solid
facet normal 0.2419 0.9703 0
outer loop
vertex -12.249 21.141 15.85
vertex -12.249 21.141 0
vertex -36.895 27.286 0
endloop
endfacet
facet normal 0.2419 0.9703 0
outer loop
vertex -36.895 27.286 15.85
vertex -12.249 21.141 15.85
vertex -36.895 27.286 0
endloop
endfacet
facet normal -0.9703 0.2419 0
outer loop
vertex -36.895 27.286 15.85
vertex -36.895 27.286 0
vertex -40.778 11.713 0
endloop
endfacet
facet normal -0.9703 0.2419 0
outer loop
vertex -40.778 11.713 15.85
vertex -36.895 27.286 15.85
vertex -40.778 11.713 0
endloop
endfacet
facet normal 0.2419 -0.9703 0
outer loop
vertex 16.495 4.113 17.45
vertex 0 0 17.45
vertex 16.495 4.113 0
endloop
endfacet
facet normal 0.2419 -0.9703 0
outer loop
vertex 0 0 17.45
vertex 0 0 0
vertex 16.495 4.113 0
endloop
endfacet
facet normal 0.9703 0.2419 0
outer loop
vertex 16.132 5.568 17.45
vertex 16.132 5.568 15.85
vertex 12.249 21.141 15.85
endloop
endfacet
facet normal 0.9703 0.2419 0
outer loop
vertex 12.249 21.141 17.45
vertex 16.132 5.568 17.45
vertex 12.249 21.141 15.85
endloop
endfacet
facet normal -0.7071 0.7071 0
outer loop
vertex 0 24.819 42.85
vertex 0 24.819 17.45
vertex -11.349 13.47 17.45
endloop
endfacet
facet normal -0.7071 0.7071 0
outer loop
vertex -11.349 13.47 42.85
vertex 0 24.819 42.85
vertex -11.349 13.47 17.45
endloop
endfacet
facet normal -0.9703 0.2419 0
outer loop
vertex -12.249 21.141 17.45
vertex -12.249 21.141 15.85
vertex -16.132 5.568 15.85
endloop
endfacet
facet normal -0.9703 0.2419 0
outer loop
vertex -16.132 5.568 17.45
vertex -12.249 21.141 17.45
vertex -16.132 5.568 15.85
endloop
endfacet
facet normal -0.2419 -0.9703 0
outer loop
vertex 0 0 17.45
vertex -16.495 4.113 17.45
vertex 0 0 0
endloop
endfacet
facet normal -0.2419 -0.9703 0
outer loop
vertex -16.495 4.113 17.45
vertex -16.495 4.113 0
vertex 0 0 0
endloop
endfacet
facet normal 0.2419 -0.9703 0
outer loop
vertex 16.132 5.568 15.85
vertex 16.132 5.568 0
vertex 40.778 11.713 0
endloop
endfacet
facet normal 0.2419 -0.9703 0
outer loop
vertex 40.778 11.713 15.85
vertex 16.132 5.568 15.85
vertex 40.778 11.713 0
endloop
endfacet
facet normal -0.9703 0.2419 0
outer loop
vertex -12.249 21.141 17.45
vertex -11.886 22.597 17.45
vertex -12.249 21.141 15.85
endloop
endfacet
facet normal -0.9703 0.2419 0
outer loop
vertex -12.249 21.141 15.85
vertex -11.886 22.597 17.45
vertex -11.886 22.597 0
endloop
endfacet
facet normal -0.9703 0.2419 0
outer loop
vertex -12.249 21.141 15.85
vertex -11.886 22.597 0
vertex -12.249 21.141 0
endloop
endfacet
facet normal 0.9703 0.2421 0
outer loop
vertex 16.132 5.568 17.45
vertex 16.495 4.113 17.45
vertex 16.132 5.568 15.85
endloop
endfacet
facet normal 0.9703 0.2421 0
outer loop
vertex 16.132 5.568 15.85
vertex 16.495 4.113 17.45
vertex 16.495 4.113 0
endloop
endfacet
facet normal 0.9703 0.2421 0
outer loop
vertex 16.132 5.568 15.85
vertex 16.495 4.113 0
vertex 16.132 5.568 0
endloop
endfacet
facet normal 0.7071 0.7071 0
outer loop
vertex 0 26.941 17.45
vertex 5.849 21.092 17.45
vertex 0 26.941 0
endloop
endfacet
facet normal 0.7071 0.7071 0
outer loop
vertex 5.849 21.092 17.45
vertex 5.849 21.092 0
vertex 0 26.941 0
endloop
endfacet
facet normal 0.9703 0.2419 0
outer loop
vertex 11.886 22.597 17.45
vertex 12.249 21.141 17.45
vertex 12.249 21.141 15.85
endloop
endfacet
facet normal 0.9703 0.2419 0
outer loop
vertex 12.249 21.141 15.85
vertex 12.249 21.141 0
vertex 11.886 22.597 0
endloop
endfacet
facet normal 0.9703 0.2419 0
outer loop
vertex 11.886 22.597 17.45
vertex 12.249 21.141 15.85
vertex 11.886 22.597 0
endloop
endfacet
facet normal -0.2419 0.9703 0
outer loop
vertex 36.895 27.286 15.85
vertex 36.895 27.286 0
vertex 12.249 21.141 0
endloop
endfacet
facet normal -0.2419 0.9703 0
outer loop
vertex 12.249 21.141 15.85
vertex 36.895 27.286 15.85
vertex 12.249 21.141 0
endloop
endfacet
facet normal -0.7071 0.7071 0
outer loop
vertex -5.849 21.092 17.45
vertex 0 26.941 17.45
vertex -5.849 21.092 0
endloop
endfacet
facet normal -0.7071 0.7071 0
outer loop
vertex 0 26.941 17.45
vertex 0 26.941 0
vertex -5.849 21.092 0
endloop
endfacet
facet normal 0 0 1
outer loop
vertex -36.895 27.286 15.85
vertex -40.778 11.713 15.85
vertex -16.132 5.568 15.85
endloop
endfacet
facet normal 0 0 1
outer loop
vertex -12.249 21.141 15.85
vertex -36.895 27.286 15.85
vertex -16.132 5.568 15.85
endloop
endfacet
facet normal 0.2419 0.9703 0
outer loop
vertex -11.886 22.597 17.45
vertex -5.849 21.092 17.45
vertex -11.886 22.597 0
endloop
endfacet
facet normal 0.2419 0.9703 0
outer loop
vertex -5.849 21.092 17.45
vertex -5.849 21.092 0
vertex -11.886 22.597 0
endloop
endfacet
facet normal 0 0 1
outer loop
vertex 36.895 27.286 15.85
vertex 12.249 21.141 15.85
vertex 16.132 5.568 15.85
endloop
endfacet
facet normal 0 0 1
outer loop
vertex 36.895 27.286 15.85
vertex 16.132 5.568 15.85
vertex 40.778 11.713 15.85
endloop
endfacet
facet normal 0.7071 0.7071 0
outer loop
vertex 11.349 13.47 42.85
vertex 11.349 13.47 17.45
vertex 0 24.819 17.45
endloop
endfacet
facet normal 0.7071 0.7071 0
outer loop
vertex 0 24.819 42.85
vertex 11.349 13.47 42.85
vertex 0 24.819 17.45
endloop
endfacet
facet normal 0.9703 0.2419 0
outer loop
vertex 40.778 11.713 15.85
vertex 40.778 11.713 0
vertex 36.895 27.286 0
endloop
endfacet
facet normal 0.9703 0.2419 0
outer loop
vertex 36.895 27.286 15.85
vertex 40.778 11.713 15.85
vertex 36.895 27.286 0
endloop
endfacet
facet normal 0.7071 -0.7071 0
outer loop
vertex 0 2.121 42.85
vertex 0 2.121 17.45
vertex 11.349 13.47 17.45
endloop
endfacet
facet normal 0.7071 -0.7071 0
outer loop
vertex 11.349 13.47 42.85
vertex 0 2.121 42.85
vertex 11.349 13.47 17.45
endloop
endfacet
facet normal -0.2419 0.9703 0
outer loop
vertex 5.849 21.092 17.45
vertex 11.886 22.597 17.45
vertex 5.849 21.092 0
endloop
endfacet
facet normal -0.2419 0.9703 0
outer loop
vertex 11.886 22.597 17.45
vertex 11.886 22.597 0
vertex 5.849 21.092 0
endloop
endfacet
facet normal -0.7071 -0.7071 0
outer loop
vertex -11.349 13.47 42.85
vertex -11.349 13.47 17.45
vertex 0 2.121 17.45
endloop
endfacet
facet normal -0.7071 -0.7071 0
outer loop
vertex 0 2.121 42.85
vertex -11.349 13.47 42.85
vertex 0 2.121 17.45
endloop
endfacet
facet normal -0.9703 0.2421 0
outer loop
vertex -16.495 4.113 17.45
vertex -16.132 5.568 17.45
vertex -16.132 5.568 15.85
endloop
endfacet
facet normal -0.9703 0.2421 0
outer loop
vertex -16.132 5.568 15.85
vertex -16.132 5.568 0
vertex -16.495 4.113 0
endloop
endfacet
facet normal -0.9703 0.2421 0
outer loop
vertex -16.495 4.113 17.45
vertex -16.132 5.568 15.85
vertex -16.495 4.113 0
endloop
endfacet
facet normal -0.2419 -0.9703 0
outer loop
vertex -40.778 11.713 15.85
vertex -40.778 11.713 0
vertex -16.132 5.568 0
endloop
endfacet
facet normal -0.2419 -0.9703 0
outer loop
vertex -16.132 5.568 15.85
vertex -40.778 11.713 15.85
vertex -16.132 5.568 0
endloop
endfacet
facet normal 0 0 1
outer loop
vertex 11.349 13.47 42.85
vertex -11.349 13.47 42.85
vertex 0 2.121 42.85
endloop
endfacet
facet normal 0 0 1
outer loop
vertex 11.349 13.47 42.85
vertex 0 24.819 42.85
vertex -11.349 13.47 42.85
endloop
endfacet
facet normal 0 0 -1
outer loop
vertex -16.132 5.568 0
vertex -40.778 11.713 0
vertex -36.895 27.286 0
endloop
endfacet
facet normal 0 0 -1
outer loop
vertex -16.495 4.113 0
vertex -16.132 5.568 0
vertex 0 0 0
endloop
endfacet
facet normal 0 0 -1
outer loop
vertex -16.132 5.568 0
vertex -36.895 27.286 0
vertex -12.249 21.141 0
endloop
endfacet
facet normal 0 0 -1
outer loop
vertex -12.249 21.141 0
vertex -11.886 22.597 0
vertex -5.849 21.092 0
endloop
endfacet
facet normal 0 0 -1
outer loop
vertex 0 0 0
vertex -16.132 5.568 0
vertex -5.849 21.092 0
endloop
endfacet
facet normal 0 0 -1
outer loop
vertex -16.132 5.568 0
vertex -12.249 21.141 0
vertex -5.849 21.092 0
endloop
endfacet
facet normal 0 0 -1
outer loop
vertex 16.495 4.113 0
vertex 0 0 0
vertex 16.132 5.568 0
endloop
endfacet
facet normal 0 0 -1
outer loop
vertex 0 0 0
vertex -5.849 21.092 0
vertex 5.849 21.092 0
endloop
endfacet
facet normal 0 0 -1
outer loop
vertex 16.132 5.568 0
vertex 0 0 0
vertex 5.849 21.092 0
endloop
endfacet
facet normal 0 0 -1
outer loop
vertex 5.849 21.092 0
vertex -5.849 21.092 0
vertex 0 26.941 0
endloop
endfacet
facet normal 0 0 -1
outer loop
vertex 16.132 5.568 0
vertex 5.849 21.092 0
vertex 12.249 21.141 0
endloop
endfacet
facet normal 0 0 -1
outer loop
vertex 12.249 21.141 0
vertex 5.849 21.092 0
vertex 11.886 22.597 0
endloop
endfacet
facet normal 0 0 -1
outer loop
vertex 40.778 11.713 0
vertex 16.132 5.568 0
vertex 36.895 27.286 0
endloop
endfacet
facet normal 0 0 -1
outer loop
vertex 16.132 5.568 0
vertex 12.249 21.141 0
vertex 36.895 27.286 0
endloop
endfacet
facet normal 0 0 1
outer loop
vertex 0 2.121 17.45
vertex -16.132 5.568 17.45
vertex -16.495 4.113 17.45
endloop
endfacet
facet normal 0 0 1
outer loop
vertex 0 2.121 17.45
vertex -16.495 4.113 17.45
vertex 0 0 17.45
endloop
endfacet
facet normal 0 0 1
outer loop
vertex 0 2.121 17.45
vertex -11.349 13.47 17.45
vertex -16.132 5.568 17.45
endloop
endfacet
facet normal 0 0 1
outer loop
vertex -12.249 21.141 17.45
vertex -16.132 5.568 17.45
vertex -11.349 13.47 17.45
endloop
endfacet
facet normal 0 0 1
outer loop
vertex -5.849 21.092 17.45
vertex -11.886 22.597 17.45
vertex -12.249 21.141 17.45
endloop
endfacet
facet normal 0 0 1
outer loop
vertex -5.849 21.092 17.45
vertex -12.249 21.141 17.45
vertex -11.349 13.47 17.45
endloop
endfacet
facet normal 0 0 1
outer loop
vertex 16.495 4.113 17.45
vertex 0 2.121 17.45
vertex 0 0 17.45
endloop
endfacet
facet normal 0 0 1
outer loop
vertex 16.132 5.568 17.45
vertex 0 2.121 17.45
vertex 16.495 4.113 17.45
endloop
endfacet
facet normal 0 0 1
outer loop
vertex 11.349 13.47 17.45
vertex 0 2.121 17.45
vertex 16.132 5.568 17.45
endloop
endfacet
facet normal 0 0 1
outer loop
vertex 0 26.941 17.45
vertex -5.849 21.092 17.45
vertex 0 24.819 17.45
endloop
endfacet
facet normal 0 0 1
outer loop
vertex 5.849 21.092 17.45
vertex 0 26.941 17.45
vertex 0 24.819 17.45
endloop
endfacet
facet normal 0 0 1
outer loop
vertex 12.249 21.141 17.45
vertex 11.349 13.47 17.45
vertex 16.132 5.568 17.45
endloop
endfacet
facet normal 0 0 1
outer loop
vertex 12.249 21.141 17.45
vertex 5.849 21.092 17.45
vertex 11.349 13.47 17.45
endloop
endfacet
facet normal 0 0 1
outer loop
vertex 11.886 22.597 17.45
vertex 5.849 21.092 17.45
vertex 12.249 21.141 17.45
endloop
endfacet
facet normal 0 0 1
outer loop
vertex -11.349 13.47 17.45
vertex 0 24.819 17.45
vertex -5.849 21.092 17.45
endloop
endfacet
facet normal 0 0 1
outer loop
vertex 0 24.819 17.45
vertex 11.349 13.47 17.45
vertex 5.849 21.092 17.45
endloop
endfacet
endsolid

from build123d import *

# Parameters (mm, degrees)
F1_DEPTH = 15.85
F3_DEPTH = 1.6
F5_DEPTH = 25.4


with BuildPart() as f1:
    # F0 (on Top) → F1 (new body)
    with BuildSketch(Plane.XY):
        Polygon((-16.495027, 4.112672), (0, 0), (16.495027, 4.112672), (16.132145, 5.568116), (40.777656, 11.712932), (36.89481, 27.286178), (12.249298, 21.141362), (11.886415, 22.596806), (5.849207, 21.091561), (0, 26.940768), (-5.849207, 21.091561), (-11.886415, 22.596806), (-12.249298, 21.141362), (-36.89481, 27.286178), (-40.777656, 11.712932), (-16.132145, 5.568116), align=None)
    extrude(amount=F1_DEPTH)

    # F2 (on face) → F3 (join)
    with BuildSketch(Plane.XY.offset(15.85)):
        Polygon((-16.132145, 5.568116), (-16.495027, 4.112672), (0, 0), (16.495027, 4.112672), (16.132145, 5.568116), (12.249298, 21.141362), (11.886415, 22.596806), (5.849207, 21.091561), (0, 26.940768), (-5.849207, 21.091561), (-11.886415, 22.596806), (-12.249298, 21.141362), align=None)
    extrude(amount=F3_DEPTH)

    # F4 (on face) → F5 (join)
    with BuildSketch(Plane.XY.offset(17.45)):
        Polygon((-11.349064, 13.470384), (0, 2.12132), (11.349064, 13.470384), (0, 24.819448), align=None)
    extrude(amount=F5_DEPTH)


solid = f1.part
